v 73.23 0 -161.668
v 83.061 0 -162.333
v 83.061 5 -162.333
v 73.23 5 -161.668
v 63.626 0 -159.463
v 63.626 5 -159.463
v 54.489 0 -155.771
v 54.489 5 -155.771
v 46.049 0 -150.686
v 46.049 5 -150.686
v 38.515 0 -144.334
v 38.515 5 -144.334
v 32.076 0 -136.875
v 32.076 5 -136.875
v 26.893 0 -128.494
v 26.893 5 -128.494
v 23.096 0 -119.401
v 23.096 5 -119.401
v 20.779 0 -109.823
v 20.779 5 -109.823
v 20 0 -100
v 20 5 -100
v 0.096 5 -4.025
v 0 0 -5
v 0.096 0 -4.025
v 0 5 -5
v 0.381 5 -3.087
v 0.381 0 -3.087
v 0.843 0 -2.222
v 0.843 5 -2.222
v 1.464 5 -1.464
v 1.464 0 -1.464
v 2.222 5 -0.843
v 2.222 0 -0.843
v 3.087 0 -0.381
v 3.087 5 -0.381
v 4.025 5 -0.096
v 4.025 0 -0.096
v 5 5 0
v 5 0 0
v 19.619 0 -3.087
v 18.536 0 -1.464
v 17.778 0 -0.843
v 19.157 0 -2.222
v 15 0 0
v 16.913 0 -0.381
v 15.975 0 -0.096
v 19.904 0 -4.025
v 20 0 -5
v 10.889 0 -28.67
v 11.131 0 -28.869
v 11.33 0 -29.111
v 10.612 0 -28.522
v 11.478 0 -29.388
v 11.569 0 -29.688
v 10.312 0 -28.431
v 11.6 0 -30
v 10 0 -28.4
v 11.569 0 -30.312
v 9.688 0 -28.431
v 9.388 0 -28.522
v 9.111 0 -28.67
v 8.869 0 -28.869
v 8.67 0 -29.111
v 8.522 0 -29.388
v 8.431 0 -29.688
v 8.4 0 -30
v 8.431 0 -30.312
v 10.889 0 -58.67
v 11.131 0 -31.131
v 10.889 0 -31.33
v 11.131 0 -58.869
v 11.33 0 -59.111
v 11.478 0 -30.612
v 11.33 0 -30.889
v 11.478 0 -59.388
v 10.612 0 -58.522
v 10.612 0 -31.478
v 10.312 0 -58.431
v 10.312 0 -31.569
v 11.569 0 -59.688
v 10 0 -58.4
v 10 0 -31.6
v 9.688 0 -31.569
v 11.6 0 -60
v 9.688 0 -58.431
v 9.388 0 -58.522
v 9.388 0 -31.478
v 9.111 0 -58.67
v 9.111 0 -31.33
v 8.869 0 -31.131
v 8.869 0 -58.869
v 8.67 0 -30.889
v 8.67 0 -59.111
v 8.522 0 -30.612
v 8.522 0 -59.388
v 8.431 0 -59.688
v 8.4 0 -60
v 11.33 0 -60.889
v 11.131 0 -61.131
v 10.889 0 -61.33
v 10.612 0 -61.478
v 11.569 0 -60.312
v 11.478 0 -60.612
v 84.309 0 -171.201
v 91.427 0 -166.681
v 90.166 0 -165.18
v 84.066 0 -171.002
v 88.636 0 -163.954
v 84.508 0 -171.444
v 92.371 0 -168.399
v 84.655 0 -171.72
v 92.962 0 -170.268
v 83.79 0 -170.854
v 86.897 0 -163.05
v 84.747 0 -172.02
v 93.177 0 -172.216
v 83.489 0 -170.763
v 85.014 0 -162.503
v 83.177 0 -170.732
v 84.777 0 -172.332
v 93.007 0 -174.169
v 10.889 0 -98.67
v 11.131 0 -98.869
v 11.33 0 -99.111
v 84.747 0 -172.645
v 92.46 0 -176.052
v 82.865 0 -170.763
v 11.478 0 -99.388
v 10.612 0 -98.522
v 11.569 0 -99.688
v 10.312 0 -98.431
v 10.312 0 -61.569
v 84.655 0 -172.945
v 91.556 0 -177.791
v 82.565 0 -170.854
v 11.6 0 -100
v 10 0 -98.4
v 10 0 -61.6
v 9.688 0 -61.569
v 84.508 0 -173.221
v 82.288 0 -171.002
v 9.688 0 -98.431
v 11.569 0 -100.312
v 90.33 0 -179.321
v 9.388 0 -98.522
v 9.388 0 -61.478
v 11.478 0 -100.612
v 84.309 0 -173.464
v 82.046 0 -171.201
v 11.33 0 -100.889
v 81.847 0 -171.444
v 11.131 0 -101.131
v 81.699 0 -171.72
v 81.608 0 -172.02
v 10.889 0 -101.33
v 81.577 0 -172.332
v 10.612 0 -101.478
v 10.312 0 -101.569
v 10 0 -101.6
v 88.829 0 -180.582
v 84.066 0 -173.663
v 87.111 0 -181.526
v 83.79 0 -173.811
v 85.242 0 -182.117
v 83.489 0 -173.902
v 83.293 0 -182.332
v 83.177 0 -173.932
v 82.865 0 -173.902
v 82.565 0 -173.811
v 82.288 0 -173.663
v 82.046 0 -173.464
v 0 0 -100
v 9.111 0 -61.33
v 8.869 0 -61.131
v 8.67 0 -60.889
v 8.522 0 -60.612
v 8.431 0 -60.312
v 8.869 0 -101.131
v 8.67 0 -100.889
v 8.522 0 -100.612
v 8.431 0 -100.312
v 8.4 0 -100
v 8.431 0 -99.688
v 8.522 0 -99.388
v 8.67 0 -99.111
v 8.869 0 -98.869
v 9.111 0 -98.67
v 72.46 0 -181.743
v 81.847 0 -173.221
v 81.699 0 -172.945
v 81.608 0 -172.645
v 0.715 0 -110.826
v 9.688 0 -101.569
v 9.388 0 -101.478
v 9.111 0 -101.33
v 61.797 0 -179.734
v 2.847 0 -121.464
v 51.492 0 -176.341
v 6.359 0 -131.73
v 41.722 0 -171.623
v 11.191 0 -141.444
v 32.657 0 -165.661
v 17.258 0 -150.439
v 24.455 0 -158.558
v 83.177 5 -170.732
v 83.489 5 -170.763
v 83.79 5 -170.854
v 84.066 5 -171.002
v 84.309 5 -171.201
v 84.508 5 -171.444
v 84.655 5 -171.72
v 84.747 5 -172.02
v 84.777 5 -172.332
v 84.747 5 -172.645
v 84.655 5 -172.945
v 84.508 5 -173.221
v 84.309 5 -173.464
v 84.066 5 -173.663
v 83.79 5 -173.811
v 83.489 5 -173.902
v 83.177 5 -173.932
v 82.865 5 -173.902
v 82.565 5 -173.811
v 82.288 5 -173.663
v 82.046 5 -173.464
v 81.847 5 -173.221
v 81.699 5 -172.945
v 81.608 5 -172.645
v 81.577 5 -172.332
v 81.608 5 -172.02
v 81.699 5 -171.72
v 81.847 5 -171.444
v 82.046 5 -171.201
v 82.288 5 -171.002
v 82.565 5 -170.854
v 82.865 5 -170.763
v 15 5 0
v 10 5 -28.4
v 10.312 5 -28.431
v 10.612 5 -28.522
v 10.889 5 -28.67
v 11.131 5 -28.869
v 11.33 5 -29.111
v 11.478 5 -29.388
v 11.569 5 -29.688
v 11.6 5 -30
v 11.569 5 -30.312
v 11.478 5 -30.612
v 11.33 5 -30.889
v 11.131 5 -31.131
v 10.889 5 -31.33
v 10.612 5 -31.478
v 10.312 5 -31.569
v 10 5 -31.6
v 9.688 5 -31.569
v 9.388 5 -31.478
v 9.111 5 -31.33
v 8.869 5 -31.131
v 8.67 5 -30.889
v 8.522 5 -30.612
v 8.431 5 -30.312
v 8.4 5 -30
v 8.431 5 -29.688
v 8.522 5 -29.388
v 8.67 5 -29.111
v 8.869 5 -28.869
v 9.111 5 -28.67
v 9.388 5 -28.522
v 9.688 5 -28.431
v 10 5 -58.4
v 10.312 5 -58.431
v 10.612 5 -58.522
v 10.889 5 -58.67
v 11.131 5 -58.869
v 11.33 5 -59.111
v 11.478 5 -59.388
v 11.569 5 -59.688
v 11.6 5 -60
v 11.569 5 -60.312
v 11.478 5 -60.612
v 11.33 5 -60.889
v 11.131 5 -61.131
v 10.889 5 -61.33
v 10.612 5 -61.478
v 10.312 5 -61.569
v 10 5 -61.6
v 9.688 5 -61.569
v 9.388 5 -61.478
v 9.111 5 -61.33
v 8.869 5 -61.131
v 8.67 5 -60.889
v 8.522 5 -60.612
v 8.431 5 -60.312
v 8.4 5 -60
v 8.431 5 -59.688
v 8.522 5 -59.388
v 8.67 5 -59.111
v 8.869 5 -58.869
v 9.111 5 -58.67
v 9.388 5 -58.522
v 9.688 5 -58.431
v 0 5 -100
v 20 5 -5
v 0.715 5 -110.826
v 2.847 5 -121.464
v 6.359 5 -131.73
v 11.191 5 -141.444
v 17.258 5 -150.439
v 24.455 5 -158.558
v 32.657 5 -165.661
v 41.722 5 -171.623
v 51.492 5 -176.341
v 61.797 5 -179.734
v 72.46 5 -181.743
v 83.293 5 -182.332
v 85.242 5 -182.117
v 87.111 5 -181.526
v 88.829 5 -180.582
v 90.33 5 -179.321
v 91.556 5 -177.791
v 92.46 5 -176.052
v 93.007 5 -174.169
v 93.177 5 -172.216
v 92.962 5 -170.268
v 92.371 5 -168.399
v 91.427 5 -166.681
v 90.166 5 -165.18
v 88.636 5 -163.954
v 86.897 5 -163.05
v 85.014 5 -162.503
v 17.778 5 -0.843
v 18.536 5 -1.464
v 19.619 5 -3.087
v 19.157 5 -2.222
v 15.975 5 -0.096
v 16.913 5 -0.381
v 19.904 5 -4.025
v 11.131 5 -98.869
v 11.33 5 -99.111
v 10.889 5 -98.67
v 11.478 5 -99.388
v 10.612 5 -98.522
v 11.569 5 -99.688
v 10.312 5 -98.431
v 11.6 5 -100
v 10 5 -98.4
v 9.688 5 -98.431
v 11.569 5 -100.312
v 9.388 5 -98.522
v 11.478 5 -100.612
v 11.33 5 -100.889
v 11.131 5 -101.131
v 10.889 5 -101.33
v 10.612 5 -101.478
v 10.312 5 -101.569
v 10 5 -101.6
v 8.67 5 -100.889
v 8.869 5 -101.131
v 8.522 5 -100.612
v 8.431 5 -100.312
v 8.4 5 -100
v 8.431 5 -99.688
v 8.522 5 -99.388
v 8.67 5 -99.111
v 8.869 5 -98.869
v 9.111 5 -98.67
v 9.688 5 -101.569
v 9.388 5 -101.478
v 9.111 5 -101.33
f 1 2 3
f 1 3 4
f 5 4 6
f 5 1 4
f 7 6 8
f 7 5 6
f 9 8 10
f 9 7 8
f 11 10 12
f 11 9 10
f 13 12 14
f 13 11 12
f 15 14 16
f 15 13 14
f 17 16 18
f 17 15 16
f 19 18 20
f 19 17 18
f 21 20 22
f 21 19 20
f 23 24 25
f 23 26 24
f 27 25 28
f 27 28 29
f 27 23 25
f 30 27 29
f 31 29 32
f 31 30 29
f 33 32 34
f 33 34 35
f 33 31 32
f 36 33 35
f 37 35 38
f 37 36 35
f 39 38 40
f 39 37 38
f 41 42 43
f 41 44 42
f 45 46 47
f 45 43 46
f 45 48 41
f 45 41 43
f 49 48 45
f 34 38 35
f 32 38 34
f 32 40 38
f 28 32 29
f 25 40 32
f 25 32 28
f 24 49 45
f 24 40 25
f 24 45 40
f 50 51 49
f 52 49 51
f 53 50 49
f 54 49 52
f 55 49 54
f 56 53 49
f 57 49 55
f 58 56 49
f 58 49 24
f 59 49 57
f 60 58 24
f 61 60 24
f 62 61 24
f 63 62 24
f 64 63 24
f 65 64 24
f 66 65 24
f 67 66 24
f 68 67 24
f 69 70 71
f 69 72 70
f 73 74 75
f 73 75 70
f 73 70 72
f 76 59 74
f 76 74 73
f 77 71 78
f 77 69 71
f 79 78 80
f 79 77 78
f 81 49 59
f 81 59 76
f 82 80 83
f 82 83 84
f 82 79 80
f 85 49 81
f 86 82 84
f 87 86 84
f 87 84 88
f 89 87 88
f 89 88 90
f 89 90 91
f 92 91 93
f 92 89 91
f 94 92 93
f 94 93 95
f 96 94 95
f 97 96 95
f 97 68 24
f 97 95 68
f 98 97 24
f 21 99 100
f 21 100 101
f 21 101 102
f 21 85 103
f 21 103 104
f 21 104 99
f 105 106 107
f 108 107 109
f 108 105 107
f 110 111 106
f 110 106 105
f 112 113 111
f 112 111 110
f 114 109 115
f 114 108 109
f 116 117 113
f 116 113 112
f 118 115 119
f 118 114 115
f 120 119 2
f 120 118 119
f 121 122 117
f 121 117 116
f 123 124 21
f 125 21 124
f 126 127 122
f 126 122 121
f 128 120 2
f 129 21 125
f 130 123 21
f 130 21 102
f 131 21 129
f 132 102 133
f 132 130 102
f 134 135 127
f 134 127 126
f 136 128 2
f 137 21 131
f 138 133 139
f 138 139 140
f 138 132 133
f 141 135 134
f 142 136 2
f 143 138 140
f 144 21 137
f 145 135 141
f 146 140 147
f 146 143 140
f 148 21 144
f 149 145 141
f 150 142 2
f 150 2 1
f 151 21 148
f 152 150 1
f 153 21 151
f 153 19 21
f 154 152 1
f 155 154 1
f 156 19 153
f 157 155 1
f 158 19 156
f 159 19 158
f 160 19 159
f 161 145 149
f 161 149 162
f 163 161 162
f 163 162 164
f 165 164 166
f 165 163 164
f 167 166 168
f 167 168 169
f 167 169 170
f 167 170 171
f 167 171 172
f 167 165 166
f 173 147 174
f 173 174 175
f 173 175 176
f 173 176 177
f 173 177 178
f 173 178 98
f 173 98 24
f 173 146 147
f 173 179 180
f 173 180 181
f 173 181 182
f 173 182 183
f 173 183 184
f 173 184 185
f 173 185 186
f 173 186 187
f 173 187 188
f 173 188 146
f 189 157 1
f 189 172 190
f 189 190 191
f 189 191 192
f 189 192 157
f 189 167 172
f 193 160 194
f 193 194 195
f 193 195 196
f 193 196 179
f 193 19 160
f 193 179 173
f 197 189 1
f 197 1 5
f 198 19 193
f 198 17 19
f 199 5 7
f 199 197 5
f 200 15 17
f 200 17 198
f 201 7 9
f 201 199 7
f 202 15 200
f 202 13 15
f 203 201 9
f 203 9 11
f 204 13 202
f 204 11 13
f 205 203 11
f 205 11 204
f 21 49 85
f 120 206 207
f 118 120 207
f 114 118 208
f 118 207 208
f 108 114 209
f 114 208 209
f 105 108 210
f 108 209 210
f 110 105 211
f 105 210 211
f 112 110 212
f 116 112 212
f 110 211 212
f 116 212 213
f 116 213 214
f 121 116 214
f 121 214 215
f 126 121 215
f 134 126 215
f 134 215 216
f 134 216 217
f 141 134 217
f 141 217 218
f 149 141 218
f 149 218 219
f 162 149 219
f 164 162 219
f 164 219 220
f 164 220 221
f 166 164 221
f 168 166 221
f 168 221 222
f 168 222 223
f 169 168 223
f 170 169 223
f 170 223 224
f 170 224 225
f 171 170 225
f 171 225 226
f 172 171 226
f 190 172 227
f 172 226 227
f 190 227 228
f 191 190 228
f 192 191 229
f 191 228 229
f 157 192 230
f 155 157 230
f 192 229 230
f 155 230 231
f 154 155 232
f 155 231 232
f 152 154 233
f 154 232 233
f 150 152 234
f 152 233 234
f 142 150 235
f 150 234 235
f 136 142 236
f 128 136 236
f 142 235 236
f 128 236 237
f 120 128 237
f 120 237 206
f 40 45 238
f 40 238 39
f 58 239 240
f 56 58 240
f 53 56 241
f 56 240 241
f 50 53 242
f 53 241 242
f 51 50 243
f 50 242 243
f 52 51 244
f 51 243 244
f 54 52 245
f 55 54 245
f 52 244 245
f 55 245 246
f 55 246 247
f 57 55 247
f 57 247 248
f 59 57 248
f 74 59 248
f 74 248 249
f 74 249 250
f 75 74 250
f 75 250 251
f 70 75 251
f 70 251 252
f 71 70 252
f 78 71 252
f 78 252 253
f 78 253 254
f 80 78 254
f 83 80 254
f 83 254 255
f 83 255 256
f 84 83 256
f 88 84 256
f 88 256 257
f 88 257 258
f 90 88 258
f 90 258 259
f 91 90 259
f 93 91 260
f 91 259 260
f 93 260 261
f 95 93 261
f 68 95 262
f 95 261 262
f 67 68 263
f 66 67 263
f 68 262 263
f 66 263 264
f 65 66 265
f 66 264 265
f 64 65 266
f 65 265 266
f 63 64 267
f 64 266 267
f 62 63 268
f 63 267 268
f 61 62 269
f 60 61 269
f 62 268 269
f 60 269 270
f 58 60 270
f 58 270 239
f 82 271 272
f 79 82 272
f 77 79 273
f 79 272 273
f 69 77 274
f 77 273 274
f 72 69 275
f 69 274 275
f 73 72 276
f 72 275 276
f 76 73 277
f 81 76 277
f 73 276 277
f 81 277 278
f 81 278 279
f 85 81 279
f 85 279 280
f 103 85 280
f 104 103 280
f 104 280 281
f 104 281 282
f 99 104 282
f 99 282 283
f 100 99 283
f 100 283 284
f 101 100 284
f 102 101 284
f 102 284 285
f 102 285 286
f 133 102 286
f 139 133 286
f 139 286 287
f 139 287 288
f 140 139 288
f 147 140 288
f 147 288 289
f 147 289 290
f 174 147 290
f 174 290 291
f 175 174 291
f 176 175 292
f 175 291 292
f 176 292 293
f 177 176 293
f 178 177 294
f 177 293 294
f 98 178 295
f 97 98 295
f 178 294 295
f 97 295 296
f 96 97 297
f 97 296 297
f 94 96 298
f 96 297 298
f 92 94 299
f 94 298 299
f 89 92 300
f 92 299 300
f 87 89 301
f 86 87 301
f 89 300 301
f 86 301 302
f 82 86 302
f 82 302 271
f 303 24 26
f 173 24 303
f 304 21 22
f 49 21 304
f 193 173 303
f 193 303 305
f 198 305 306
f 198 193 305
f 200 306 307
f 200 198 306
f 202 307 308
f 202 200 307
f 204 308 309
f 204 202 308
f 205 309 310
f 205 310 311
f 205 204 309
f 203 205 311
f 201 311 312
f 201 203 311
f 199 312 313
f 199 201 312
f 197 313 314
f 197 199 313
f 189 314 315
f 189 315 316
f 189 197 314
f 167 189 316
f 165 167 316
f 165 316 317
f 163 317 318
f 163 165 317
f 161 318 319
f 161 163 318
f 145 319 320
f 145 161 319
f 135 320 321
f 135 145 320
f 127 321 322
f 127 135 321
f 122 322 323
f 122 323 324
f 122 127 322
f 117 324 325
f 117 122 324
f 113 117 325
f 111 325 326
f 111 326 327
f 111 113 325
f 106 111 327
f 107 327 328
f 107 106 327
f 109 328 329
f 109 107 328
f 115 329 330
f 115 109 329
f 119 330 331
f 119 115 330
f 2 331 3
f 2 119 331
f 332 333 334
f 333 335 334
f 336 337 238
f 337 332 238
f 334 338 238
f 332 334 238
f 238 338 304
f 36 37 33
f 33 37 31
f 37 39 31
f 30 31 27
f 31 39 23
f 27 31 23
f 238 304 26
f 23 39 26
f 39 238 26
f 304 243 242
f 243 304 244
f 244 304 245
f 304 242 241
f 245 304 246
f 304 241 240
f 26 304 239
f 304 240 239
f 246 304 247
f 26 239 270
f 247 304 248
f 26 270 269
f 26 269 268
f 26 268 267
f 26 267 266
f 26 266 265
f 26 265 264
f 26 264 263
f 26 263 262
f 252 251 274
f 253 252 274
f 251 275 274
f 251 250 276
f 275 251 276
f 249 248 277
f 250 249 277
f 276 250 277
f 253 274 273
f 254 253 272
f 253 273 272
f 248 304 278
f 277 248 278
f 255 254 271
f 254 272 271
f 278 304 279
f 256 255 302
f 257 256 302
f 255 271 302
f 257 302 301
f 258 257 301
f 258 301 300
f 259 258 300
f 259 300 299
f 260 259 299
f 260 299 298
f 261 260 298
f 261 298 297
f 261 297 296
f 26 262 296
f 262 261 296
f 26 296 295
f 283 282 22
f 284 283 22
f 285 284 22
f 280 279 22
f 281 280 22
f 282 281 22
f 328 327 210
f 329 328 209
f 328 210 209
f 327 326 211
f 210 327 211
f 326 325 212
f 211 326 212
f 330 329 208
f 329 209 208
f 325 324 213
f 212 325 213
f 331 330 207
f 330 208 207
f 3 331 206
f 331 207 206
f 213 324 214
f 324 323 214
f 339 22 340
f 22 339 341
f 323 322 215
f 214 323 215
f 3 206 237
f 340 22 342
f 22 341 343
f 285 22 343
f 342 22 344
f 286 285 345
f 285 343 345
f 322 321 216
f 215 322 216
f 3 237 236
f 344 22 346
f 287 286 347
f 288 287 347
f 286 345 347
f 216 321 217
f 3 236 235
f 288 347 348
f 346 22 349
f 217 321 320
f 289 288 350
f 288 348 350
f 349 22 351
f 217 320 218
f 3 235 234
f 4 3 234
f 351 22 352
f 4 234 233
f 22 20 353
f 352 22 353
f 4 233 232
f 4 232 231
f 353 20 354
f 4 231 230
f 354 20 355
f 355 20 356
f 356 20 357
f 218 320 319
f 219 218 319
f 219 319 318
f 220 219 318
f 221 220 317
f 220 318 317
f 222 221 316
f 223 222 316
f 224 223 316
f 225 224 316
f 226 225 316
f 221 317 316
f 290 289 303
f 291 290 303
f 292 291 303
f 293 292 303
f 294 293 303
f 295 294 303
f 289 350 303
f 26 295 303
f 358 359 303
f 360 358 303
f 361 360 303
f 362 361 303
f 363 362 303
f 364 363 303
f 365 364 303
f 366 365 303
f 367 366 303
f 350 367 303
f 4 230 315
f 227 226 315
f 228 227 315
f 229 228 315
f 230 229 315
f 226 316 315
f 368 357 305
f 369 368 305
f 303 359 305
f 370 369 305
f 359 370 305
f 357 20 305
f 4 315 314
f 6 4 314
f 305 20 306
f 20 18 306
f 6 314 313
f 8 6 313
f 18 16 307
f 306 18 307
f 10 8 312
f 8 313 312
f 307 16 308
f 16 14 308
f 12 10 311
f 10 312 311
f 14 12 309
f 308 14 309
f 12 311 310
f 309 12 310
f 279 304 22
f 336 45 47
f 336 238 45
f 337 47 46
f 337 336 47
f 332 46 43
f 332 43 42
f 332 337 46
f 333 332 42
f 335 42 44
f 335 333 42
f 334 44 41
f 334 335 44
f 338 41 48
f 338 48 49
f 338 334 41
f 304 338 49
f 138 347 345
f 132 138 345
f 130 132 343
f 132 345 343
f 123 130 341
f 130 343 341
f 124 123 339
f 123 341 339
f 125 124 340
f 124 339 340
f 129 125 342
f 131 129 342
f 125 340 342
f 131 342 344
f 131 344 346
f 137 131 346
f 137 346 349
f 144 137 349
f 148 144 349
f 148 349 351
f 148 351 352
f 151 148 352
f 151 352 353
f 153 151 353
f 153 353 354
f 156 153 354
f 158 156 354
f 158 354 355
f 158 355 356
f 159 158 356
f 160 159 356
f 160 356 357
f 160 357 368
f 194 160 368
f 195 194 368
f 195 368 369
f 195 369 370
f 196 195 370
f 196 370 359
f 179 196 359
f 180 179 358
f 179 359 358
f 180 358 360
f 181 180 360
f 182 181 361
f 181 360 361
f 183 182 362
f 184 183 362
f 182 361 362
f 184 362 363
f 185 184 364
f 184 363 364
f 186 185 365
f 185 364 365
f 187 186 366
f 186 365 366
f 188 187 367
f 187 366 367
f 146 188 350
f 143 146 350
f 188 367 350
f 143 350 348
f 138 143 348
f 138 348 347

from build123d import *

# Parameters (mm, degrees)
EXTRUDE_1_DEPTH     = 5
SKETCH_2_R          = 1.6
CUT_EXTRUDE_2_DEPTH = 205.826540078
FILLET_1_R          = 5


with BuildPart() as part:
    # 草圖1 → 伸長1 (new body)
    with BuildSketch(Plane(origin=(0, 0, 0), x_dir=(1, 0, 0), z_dir=(0, 1, 0))):
        with BuildLine():
            Line((0, 50), (0, 100))
            ThreePointArc((0, 100), (24.455049934, 158.55833165), (83.293389788, 182.331792401))
            ThreePointArc((83.293389788, 182.331792401), (93.176602271, 172.216353161), (83.061163031, 162.333140678))
            ThreePointArc((83.061163031, 162.333140678), (38.514841271, 144.334328431), (20, 100))
            Line((20, 100), (20, 50))
            Line((20, 50), (20, 0))
            Line((20, 0), (0, 0))
            Line((0, 0), (0, 50))
        make_face()
    extrude(amount=EXTRUDE_1_DEPTH)

    # 草圖2 → 伸長2 (cut, through all)
    with BuildSketch(Plane(origin=(0, 5, 0), x_dir=(1, 0, 0), z_dir=(0, 1, 0))):
        with Locations(Location((10, 60, 0), (0, 0, 270))):
            Circle(SKETCH_2_R)
        with Locations(Location((10, 30, 0), (0, 0, 270))):
            Circle(SKETCH_2_R)
        with Locations(Location((83.177276409, 172.33246654, 0), (0, 0, 270))):
            Circle(SKETCH_2_R)
        with Locations(Location((10, 100, 0), (0, 0, 270))):
            Circle(SKETCH_2_R)
    extrude(amount=-CUT_EXTRUDE_2_DEPTH, mode=Mode.SUBTRACT)

    # 圓角1
    fillet_1_edges = [part.edges().sort_by_distance(p)[0] for p in [
        (20, 2.5, 0),
        (0, 2.5, 0),
    ]]
    fillet(fillet_1_edges, radius=FILLET_1_R)


solid = part.part
